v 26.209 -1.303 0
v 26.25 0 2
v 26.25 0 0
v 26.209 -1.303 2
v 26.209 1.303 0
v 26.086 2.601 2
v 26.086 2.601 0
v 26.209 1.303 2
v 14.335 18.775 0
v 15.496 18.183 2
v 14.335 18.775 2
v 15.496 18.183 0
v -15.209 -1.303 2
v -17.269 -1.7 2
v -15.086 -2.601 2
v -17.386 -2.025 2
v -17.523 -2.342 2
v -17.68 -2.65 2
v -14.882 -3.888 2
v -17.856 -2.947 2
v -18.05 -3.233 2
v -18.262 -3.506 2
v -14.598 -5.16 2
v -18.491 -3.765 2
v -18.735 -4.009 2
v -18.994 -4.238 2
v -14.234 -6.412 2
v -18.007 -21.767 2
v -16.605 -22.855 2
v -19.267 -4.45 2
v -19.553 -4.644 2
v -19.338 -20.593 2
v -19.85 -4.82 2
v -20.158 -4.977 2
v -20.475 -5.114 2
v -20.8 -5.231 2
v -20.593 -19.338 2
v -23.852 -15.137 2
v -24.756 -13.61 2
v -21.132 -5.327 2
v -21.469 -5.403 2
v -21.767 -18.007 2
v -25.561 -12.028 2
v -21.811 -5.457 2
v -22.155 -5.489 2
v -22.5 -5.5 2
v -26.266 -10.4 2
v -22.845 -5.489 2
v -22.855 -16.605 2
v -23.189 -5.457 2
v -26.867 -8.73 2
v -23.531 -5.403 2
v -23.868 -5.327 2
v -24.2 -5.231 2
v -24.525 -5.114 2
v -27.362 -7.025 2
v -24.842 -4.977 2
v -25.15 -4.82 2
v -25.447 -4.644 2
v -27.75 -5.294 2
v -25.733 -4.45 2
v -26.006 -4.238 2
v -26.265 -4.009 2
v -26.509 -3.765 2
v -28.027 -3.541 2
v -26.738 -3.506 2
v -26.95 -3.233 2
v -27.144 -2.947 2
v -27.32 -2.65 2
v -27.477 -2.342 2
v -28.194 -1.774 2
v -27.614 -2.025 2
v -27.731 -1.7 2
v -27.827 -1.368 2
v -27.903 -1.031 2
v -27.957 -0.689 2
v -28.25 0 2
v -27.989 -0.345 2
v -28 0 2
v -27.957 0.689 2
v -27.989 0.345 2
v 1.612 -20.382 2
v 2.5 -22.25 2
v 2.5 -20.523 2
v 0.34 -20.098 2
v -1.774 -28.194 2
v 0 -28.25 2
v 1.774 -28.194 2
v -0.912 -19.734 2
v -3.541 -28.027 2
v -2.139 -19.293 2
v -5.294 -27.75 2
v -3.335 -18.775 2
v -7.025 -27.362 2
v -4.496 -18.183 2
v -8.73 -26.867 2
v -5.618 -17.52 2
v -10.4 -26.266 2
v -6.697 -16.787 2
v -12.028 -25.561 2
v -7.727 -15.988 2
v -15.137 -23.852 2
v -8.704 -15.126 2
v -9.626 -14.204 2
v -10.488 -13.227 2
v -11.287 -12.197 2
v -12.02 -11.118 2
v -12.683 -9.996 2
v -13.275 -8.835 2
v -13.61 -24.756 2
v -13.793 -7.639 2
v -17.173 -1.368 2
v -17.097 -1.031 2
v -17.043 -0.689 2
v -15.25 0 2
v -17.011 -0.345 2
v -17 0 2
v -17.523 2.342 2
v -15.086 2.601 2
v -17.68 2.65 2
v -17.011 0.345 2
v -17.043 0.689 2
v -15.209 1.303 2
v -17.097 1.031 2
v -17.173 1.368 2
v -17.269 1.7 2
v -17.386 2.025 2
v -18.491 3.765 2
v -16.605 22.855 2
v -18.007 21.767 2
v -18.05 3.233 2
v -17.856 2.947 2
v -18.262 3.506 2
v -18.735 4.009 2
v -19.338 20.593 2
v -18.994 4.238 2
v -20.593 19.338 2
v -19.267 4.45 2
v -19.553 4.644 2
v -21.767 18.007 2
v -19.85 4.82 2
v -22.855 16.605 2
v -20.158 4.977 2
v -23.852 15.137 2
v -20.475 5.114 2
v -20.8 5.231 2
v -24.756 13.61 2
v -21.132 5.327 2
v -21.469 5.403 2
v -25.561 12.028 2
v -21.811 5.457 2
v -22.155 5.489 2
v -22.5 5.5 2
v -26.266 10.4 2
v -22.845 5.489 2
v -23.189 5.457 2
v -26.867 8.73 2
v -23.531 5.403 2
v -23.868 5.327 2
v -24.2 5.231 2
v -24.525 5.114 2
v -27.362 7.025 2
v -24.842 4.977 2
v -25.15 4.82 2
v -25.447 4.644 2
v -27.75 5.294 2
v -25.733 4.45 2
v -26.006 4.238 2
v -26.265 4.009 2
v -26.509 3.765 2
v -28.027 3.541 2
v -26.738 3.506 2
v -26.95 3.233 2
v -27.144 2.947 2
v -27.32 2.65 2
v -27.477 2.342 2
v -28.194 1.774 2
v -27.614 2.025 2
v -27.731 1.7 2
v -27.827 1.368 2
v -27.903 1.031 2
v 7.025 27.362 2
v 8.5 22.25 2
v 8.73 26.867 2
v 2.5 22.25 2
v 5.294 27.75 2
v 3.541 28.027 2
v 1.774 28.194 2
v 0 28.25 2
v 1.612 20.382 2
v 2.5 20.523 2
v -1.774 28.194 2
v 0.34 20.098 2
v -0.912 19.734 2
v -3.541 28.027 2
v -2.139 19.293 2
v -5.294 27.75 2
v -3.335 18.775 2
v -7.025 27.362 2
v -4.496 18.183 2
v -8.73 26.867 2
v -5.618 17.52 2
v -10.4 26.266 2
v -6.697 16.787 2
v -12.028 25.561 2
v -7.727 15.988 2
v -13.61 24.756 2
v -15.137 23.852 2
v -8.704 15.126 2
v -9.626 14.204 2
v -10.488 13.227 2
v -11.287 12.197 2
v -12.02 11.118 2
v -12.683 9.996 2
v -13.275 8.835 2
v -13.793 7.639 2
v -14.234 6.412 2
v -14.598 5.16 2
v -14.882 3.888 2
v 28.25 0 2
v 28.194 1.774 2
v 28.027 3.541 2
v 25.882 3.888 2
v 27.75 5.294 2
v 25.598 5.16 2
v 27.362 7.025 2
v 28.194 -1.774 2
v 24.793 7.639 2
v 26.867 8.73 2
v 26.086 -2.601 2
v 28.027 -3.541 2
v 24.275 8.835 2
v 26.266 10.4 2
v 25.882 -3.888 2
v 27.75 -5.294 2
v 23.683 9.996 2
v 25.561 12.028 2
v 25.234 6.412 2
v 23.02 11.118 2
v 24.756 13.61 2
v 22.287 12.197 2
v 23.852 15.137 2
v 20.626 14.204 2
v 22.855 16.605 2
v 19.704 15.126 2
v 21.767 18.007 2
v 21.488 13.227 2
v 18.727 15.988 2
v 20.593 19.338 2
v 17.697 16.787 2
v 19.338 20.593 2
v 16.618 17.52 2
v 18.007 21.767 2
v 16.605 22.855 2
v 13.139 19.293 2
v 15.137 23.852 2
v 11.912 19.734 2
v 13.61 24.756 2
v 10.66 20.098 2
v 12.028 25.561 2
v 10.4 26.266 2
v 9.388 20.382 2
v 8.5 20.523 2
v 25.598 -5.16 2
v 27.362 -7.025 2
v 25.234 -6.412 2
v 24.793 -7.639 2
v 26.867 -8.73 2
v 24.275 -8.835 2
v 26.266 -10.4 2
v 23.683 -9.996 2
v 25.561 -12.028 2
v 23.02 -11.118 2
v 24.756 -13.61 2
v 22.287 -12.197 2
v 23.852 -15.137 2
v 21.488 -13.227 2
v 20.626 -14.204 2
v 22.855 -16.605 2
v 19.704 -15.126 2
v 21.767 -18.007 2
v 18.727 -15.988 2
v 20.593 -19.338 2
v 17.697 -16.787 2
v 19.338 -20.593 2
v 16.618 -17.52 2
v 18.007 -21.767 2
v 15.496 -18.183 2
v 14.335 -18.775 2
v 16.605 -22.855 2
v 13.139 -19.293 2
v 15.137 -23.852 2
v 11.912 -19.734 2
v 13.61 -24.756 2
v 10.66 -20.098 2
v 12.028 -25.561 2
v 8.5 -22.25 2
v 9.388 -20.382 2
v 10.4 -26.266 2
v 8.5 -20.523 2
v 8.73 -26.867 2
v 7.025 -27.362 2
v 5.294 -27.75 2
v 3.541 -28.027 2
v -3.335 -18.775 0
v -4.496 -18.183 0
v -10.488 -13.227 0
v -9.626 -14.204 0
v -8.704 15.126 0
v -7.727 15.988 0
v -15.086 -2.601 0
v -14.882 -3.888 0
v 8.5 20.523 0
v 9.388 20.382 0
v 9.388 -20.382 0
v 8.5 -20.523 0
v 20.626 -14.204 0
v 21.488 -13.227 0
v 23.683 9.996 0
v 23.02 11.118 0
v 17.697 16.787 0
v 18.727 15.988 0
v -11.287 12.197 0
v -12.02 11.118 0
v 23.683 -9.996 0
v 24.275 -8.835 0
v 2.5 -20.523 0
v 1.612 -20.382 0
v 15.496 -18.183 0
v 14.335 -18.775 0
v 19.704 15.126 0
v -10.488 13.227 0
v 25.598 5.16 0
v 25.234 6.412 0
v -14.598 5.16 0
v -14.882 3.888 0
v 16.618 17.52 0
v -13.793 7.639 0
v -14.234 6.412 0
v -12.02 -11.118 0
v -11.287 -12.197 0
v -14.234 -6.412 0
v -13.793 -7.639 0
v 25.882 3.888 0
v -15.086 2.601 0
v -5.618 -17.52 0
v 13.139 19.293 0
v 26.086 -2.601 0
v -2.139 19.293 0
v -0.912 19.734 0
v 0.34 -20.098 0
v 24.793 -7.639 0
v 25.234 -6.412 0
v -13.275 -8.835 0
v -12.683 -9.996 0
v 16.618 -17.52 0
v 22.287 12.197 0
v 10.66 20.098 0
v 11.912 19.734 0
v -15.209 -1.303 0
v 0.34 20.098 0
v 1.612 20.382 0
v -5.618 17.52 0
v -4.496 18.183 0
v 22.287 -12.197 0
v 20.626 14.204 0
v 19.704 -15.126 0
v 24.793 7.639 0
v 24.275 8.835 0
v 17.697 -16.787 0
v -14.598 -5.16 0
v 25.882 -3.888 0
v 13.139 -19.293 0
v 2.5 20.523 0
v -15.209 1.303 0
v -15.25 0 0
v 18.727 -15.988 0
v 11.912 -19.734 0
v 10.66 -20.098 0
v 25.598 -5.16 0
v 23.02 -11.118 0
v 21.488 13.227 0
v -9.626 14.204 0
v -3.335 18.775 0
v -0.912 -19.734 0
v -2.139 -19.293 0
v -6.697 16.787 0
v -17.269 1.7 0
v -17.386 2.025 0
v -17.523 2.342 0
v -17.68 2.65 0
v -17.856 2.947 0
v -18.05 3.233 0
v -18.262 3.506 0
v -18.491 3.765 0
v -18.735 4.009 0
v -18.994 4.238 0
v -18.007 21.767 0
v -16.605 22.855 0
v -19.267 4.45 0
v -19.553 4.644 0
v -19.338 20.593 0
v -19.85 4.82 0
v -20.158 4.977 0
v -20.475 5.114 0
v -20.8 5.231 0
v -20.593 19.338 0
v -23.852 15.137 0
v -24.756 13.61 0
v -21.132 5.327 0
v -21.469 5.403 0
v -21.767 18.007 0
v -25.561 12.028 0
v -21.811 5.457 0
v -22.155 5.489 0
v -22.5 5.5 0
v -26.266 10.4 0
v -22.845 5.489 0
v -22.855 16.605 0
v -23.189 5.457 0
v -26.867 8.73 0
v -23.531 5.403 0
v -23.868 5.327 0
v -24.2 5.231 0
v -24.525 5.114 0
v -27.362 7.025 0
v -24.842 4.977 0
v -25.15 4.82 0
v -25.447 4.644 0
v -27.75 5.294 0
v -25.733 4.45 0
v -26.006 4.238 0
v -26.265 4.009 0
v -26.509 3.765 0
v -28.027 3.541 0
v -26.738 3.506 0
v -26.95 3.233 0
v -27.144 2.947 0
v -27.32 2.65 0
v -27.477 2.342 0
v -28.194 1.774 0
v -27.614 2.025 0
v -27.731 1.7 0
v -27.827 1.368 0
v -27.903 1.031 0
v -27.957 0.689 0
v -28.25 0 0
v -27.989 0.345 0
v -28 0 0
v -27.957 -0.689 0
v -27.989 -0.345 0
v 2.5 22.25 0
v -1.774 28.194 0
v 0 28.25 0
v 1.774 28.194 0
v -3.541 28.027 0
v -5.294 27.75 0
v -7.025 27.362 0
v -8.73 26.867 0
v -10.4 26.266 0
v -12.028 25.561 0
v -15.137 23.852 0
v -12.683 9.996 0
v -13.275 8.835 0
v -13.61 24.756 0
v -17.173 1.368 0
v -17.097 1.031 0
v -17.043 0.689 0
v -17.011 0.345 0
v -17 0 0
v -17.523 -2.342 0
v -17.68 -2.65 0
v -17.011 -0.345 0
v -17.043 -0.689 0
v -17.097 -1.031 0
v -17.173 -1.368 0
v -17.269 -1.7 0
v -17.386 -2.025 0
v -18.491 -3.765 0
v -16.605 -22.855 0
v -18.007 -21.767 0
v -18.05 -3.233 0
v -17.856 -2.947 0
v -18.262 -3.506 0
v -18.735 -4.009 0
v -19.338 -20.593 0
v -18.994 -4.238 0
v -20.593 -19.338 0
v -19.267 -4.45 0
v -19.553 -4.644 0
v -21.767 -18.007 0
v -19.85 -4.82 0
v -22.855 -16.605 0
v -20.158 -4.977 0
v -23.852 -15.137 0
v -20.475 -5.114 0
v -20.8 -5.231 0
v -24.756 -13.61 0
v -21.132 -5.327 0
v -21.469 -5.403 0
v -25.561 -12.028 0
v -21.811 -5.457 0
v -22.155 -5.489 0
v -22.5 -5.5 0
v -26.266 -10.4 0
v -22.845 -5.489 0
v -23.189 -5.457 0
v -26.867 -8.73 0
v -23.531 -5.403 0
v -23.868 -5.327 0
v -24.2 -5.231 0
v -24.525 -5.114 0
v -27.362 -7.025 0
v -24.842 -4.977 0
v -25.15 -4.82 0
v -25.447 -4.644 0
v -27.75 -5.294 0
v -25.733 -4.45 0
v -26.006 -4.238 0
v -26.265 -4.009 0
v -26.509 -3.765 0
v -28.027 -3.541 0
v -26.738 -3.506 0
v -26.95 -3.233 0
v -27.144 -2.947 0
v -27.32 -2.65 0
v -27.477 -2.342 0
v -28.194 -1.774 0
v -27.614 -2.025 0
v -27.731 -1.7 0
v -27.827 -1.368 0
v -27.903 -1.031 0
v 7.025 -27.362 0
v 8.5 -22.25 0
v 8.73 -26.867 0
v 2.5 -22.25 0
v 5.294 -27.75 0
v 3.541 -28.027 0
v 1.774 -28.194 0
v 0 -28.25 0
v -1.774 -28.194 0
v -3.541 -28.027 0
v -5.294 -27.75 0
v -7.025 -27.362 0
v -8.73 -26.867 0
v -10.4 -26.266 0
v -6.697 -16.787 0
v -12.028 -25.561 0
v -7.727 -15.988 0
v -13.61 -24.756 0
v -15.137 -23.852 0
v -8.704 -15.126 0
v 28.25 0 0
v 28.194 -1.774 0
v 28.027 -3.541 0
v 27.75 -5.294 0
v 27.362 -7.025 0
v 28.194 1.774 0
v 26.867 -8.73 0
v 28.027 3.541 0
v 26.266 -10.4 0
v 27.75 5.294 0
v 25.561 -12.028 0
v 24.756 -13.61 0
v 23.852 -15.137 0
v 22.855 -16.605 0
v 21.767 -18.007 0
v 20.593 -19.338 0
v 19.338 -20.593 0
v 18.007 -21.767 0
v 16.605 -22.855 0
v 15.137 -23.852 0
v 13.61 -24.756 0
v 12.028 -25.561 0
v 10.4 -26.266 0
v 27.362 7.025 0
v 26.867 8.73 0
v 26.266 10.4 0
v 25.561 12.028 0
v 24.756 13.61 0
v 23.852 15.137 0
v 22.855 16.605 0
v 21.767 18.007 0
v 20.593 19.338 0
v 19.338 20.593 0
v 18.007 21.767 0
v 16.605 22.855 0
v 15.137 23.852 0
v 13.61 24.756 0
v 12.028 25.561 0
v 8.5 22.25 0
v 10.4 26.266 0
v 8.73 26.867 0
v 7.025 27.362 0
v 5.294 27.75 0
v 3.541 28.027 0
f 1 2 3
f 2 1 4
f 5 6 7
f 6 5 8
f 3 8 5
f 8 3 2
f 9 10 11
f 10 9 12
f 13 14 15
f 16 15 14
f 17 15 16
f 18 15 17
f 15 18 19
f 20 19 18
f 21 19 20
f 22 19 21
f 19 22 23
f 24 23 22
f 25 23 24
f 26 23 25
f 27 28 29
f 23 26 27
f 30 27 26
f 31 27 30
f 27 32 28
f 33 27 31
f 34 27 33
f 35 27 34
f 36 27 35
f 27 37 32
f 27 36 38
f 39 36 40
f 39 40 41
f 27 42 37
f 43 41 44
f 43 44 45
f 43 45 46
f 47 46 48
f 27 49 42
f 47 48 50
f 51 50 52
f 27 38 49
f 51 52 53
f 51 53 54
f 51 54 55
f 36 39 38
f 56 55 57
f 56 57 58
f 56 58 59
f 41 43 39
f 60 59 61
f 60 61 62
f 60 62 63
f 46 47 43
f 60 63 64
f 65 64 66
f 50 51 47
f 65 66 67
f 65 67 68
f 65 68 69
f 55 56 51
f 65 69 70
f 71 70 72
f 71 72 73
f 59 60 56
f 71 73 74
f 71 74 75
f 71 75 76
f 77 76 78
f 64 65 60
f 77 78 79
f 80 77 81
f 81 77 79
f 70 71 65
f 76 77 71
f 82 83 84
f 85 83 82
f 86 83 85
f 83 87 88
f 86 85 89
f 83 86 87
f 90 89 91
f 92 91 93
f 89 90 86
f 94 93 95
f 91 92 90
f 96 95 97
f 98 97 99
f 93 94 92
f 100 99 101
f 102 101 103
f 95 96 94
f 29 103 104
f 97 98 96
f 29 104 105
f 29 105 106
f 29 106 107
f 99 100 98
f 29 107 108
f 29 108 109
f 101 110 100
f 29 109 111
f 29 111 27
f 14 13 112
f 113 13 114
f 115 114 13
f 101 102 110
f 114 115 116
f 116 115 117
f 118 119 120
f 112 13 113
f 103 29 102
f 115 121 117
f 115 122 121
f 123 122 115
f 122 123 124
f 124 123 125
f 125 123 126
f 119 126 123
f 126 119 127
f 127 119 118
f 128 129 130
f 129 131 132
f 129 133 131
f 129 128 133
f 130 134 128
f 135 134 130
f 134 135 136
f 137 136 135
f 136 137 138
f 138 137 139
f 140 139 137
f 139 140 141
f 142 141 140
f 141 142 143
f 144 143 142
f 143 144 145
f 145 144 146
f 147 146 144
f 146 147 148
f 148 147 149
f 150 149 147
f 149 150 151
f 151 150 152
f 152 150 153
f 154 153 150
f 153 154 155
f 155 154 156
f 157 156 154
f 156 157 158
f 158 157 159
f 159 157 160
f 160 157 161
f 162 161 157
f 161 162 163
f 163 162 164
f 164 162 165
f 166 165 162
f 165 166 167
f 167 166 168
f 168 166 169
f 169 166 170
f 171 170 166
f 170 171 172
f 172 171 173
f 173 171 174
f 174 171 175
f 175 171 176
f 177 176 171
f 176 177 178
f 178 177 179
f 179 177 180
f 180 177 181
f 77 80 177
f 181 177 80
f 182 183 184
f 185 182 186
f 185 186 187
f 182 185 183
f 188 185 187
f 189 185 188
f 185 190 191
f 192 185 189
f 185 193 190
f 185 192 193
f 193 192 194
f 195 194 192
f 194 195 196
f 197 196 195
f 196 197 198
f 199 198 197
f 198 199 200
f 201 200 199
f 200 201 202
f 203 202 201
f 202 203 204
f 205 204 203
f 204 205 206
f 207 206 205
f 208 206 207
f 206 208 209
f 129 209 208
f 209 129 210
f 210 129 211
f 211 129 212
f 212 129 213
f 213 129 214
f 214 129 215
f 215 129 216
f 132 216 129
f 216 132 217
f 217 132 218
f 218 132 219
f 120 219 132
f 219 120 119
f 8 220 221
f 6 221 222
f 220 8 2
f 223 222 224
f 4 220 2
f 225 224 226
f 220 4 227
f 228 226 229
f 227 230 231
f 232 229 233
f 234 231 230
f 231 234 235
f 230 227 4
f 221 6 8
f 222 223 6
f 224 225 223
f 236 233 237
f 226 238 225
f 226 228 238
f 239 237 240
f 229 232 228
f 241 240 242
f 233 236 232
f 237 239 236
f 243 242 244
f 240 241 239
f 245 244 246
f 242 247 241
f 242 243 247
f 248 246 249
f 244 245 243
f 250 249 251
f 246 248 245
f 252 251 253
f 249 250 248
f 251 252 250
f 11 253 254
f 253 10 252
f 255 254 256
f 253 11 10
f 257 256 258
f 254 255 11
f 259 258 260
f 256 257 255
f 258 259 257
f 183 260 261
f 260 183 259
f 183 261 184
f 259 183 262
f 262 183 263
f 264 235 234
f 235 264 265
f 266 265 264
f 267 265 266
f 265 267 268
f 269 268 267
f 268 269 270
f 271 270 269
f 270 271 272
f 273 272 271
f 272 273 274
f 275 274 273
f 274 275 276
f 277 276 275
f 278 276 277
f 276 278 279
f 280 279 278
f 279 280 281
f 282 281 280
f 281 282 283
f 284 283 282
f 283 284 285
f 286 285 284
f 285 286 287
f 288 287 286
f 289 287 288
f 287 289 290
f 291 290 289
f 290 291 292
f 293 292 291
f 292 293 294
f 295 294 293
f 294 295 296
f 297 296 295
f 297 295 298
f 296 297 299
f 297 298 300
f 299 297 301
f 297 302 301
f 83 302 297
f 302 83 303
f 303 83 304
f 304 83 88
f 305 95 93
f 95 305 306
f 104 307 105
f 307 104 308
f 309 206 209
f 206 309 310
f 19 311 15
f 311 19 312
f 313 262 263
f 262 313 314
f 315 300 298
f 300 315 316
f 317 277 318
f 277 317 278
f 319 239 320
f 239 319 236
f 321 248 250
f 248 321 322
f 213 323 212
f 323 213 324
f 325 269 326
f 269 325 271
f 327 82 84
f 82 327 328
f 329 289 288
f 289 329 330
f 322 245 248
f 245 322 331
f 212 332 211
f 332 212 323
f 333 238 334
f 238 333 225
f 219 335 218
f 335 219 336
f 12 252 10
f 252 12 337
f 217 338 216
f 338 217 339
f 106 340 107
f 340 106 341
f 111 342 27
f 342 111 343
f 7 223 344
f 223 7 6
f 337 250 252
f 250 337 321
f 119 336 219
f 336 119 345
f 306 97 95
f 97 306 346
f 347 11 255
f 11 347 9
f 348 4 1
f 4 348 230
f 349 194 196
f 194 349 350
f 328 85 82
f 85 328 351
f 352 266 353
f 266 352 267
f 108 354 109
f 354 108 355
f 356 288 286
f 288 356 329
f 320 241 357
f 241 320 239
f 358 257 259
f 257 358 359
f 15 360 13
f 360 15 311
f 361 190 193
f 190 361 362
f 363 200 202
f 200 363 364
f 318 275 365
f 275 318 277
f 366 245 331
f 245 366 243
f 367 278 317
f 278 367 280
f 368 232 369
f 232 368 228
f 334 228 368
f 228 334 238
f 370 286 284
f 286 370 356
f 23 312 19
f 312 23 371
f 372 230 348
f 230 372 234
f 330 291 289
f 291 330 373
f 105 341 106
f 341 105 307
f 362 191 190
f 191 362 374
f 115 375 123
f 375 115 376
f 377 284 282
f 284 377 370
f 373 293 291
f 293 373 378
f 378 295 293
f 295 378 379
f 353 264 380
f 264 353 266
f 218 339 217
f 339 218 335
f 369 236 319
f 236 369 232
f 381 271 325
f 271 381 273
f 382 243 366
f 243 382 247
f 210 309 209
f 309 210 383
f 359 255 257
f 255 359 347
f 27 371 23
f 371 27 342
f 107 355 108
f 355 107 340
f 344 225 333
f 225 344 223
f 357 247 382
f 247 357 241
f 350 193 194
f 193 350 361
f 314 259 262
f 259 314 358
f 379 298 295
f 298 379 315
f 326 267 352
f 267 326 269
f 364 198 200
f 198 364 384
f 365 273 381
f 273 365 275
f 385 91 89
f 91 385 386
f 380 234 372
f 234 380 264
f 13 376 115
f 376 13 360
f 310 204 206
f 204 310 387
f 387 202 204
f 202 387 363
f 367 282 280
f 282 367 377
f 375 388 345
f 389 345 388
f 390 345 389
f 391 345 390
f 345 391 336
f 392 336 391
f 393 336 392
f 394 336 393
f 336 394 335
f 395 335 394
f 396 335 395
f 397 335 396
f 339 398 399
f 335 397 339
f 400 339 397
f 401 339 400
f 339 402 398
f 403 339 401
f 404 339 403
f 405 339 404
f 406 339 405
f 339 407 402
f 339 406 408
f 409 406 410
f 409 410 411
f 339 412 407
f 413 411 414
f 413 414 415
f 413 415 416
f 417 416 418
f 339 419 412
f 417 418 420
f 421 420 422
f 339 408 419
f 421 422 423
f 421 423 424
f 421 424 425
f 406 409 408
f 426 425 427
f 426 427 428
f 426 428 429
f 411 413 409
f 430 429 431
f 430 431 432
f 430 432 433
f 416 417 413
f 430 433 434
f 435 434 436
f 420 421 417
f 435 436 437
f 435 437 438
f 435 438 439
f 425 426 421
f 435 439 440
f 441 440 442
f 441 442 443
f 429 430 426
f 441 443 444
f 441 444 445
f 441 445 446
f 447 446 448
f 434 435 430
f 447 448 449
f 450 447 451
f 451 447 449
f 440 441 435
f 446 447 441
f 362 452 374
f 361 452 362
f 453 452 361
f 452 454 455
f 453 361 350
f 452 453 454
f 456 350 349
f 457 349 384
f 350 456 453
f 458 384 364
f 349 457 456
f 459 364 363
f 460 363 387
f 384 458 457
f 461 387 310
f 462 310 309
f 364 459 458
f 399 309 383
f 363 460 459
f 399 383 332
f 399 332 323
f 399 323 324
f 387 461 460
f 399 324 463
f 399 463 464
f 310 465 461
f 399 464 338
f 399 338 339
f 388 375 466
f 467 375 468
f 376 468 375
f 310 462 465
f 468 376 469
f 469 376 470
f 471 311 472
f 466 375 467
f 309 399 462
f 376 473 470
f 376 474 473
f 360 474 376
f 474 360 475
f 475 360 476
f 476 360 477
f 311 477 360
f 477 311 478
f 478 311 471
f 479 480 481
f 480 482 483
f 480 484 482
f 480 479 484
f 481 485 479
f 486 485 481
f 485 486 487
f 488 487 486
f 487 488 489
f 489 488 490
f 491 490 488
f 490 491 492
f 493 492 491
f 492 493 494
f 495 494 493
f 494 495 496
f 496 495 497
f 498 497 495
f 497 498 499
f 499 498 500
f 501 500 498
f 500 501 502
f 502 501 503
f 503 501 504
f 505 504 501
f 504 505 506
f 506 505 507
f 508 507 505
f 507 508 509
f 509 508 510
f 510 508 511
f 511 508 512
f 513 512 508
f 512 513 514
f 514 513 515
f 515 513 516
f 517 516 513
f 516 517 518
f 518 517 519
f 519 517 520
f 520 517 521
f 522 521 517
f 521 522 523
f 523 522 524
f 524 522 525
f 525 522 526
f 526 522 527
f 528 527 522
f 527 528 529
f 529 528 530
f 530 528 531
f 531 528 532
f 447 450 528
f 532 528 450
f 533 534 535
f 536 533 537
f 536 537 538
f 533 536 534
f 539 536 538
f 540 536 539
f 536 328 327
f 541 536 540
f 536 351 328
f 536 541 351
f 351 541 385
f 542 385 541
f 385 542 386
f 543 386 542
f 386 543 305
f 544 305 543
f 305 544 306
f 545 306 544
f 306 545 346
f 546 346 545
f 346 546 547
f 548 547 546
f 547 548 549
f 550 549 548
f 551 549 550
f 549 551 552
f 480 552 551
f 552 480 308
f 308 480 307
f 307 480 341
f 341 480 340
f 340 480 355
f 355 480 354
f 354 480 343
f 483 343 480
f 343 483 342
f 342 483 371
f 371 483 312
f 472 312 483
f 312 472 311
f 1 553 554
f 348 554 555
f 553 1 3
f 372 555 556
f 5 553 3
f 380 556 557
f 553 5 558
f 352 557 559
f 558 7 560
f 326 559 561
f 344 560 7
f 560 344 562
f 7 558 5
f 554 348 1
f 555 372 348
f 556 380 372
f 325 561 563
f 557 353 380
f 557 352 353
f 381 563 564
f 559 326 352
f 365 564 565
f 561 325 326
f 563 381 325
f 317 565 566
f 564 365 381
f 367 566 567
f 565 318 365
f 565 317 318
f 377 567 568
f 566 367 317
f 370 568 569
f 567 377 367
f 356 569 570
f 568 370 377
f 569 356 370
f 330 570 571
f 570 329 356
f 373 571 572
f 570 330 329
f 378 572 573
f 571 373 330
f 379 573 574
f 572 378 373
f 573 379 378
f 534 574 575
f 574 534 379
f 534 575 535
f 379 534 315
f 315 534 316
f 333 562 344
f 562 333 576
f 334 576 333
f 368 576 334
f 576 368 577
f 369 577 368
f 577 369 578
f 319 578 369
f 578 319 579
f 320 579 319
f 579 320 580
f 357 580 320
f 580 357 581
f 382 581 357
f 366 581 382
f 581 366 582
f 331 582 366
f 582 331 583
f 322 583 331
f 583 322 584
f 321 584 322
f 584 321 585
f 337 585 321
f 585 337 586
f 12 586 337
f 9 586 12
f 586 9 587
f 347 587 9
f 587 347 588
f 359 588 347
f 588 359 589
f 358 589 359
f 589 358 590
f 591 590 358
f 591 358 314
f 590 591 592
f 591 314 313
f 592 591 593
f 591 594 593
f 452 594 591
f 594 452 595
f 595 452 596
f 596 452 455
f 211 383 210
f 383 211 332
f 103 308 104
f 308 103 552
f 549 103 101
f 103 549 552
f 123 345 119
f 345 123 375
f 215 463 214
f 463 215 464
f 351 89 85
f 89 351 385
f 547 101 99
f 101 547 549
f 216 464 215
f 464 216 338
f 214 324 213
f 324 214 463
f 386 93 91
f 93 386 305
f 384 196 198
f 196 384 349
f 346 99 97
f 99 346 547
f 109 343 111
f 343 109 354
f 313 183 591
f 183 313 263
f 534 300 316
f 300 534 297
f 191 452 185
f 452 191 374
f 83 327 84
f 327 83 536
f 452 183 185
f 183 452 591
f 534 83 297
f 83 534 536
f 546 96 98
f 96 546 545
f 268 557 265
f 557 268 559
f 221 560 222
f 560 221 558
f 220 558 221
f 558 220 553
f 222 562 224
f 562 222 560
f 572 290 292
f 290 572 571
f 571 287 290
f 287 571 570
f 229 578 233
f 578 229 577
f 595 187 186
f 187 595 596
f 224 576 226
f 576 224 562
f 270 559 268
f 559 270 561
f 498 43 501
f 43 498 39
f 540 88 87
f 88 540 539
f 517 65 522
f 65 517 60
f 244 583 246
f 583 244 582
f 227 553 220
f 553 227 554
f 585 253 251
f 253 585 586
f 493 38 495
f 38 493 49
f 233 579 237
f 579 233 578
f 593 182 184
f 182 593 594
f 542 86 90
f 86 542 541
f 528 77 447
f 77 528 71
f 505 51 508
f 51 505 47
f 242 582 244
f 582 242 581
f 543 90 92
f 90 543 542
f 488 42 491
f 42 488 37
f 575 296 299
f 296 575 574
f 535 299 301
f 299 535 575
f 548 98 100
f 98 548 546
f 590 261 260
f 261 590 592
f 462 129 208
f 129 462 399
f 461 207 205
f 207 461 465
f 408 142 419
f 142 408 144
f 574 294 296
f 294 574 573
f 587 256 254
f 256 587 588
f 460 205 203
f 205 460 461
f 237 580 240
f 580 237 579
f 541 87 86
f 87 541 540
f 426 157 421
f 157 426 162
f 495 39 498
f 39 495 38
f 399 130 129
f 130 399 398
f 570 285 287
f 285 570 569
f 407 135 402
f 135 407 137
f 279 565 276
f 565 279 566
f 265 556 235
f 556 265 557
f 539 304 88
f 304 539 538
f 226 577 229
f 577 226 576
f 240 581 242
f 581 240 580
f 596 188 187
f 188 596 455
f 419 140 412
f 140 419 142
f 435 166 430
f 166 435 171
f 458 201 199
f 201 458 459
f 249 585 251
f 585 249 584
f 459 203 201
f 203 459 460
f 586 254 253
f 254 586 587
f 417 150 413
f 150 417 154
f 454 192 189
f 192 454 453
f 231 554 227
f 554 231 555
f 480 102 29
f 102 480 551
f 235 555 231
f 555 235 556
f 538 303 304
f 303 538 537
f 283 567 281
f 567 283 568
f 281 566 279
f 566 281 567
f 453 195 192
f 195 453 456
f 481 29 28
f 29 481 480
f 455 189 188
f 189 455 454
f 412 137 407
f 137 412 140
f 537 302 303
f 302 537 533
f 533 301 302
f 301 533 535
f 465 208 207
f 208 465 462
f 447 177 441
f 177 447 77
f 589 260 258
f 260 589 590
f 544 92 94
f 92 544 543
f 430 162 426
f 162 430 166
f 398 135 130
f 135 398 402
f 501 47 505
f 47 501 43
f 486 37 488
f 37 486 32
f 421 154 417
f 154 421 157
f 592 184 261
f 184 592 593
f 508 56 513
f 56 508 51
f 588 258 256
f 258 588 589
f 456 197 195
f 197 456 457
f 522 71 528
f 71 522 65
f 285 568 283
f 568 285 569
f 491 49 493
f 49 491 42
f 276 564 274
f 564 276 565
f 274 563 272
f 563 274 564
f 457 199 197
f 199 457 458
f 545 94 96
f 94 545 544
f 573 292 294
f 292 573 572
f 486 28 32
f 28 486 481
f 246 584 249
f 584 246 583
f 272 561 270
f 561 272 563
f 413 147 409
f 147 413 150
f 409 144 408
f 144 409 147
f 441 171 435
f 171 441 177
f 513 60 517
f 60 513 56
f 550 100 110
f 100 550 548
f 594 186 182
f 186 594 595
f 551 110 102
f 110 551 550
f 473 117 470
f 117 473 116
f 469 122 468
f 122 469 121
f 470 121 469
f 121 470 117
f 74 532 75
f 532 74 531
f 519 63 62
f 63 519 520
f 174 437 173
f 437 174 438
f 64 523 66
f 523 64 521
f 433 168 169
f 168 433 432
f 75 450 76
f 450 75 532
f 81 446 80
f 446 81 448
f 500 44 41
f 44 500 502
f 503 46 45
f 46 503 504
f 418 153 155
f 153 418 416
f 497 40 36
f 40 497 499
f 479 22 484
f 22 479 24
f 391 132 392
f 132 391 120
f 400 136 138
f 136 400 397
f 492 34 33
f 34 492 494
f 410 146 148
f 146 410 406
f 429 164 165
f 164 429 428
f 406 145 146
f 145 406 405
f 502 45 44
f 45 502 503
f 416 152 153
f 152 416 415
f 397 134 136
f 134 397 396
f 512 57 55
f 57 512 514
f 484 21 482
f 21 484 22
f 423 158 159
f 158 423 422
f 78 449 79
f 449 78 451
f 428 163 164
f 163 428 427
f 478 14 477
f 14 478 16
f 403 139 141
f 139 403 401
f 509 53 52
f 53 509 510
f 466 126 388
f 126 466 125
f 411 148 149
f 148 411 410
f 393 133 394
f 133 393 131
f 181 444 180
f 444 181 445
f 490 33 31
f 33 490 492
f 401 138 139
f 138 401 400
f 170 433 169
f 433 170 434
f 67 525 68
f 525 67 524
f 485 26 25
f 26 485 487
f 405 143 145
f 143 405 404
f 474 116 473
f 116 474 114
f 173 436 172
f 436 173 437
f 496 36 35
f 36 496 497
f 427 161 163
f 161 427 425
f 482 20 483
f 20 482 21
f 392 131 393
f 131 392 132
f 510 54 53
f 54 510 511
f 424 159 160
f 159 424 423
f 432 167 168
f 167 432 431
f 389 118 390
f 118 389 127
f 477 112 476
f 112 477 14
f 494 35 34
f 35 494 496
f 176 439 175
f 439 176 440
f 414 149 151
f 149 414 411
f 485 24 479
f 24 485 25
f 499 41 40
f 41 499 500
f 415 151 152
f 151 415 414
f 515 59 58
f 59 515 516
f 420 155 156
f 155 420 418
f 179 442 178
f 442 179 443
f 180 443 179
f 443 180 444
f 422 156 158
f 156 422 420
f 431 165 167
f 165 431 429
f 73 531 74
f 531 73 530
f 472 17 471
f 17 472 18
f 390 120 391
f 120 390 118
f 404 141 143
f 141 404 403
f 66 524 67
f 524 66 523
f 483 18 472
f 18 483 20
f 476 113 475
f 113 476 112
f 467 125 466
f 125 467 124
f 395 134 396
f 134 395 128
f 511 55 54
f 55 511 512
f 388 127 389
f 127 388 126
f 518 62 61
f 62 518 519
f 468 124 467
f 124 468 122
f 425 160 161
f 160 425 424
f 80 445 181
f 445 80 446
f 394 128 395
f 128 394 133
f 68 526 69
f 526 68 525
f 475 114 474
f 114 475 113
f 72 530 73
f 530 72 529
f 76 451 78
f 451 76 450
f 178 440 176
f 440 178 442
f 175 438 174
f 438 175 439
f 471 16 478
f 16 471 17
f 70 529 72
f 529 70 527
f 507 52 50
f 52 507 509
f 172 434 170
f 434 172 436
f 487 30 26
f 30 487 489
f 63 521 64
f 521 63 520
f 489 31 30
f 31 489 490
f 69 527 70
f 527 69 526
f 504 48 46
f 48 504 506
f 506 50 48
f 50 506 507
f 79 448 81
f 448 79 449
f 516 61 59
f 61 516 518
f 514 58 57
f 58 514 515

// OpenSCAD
THICKNESS = 2;
OUTER_DIA = 56.5;
INNER_DIA = 41.5;
SLOT_WIDTH = 6;
SLOT_DEPTH = 1.5;

PORT = true;
HIGROMETER_OFFSET = PORT ? (OUTER_DIA-INNER_DIA)/2 - 2 : 0;
PORT_DIA = 11;
PORT_OFFSET = -22.5;

$fn = 100;

difference() {
  cylinder(d = OUTER_DIA, h = THICKNESS);
  translate([HIGROMETER_OFFSET, 0, 0]) {
    #cylinder(d = INNER_DIA, h = THICKNESS);
    #translate([-SLOT_WIDTH/2, -SLOT_DEPTH - INNER_DIA/2, 0])
    cube([SLOT_WIDTH, SLOT_DEPTH * 2 + INNER_DIA, THICKNESS]);
  }

  #if(PORT) {
    translate([PORT_OFFSET, 0, 0])
    cylinder(d = PORT_DIA, h = THICKNESS);
  }
}
